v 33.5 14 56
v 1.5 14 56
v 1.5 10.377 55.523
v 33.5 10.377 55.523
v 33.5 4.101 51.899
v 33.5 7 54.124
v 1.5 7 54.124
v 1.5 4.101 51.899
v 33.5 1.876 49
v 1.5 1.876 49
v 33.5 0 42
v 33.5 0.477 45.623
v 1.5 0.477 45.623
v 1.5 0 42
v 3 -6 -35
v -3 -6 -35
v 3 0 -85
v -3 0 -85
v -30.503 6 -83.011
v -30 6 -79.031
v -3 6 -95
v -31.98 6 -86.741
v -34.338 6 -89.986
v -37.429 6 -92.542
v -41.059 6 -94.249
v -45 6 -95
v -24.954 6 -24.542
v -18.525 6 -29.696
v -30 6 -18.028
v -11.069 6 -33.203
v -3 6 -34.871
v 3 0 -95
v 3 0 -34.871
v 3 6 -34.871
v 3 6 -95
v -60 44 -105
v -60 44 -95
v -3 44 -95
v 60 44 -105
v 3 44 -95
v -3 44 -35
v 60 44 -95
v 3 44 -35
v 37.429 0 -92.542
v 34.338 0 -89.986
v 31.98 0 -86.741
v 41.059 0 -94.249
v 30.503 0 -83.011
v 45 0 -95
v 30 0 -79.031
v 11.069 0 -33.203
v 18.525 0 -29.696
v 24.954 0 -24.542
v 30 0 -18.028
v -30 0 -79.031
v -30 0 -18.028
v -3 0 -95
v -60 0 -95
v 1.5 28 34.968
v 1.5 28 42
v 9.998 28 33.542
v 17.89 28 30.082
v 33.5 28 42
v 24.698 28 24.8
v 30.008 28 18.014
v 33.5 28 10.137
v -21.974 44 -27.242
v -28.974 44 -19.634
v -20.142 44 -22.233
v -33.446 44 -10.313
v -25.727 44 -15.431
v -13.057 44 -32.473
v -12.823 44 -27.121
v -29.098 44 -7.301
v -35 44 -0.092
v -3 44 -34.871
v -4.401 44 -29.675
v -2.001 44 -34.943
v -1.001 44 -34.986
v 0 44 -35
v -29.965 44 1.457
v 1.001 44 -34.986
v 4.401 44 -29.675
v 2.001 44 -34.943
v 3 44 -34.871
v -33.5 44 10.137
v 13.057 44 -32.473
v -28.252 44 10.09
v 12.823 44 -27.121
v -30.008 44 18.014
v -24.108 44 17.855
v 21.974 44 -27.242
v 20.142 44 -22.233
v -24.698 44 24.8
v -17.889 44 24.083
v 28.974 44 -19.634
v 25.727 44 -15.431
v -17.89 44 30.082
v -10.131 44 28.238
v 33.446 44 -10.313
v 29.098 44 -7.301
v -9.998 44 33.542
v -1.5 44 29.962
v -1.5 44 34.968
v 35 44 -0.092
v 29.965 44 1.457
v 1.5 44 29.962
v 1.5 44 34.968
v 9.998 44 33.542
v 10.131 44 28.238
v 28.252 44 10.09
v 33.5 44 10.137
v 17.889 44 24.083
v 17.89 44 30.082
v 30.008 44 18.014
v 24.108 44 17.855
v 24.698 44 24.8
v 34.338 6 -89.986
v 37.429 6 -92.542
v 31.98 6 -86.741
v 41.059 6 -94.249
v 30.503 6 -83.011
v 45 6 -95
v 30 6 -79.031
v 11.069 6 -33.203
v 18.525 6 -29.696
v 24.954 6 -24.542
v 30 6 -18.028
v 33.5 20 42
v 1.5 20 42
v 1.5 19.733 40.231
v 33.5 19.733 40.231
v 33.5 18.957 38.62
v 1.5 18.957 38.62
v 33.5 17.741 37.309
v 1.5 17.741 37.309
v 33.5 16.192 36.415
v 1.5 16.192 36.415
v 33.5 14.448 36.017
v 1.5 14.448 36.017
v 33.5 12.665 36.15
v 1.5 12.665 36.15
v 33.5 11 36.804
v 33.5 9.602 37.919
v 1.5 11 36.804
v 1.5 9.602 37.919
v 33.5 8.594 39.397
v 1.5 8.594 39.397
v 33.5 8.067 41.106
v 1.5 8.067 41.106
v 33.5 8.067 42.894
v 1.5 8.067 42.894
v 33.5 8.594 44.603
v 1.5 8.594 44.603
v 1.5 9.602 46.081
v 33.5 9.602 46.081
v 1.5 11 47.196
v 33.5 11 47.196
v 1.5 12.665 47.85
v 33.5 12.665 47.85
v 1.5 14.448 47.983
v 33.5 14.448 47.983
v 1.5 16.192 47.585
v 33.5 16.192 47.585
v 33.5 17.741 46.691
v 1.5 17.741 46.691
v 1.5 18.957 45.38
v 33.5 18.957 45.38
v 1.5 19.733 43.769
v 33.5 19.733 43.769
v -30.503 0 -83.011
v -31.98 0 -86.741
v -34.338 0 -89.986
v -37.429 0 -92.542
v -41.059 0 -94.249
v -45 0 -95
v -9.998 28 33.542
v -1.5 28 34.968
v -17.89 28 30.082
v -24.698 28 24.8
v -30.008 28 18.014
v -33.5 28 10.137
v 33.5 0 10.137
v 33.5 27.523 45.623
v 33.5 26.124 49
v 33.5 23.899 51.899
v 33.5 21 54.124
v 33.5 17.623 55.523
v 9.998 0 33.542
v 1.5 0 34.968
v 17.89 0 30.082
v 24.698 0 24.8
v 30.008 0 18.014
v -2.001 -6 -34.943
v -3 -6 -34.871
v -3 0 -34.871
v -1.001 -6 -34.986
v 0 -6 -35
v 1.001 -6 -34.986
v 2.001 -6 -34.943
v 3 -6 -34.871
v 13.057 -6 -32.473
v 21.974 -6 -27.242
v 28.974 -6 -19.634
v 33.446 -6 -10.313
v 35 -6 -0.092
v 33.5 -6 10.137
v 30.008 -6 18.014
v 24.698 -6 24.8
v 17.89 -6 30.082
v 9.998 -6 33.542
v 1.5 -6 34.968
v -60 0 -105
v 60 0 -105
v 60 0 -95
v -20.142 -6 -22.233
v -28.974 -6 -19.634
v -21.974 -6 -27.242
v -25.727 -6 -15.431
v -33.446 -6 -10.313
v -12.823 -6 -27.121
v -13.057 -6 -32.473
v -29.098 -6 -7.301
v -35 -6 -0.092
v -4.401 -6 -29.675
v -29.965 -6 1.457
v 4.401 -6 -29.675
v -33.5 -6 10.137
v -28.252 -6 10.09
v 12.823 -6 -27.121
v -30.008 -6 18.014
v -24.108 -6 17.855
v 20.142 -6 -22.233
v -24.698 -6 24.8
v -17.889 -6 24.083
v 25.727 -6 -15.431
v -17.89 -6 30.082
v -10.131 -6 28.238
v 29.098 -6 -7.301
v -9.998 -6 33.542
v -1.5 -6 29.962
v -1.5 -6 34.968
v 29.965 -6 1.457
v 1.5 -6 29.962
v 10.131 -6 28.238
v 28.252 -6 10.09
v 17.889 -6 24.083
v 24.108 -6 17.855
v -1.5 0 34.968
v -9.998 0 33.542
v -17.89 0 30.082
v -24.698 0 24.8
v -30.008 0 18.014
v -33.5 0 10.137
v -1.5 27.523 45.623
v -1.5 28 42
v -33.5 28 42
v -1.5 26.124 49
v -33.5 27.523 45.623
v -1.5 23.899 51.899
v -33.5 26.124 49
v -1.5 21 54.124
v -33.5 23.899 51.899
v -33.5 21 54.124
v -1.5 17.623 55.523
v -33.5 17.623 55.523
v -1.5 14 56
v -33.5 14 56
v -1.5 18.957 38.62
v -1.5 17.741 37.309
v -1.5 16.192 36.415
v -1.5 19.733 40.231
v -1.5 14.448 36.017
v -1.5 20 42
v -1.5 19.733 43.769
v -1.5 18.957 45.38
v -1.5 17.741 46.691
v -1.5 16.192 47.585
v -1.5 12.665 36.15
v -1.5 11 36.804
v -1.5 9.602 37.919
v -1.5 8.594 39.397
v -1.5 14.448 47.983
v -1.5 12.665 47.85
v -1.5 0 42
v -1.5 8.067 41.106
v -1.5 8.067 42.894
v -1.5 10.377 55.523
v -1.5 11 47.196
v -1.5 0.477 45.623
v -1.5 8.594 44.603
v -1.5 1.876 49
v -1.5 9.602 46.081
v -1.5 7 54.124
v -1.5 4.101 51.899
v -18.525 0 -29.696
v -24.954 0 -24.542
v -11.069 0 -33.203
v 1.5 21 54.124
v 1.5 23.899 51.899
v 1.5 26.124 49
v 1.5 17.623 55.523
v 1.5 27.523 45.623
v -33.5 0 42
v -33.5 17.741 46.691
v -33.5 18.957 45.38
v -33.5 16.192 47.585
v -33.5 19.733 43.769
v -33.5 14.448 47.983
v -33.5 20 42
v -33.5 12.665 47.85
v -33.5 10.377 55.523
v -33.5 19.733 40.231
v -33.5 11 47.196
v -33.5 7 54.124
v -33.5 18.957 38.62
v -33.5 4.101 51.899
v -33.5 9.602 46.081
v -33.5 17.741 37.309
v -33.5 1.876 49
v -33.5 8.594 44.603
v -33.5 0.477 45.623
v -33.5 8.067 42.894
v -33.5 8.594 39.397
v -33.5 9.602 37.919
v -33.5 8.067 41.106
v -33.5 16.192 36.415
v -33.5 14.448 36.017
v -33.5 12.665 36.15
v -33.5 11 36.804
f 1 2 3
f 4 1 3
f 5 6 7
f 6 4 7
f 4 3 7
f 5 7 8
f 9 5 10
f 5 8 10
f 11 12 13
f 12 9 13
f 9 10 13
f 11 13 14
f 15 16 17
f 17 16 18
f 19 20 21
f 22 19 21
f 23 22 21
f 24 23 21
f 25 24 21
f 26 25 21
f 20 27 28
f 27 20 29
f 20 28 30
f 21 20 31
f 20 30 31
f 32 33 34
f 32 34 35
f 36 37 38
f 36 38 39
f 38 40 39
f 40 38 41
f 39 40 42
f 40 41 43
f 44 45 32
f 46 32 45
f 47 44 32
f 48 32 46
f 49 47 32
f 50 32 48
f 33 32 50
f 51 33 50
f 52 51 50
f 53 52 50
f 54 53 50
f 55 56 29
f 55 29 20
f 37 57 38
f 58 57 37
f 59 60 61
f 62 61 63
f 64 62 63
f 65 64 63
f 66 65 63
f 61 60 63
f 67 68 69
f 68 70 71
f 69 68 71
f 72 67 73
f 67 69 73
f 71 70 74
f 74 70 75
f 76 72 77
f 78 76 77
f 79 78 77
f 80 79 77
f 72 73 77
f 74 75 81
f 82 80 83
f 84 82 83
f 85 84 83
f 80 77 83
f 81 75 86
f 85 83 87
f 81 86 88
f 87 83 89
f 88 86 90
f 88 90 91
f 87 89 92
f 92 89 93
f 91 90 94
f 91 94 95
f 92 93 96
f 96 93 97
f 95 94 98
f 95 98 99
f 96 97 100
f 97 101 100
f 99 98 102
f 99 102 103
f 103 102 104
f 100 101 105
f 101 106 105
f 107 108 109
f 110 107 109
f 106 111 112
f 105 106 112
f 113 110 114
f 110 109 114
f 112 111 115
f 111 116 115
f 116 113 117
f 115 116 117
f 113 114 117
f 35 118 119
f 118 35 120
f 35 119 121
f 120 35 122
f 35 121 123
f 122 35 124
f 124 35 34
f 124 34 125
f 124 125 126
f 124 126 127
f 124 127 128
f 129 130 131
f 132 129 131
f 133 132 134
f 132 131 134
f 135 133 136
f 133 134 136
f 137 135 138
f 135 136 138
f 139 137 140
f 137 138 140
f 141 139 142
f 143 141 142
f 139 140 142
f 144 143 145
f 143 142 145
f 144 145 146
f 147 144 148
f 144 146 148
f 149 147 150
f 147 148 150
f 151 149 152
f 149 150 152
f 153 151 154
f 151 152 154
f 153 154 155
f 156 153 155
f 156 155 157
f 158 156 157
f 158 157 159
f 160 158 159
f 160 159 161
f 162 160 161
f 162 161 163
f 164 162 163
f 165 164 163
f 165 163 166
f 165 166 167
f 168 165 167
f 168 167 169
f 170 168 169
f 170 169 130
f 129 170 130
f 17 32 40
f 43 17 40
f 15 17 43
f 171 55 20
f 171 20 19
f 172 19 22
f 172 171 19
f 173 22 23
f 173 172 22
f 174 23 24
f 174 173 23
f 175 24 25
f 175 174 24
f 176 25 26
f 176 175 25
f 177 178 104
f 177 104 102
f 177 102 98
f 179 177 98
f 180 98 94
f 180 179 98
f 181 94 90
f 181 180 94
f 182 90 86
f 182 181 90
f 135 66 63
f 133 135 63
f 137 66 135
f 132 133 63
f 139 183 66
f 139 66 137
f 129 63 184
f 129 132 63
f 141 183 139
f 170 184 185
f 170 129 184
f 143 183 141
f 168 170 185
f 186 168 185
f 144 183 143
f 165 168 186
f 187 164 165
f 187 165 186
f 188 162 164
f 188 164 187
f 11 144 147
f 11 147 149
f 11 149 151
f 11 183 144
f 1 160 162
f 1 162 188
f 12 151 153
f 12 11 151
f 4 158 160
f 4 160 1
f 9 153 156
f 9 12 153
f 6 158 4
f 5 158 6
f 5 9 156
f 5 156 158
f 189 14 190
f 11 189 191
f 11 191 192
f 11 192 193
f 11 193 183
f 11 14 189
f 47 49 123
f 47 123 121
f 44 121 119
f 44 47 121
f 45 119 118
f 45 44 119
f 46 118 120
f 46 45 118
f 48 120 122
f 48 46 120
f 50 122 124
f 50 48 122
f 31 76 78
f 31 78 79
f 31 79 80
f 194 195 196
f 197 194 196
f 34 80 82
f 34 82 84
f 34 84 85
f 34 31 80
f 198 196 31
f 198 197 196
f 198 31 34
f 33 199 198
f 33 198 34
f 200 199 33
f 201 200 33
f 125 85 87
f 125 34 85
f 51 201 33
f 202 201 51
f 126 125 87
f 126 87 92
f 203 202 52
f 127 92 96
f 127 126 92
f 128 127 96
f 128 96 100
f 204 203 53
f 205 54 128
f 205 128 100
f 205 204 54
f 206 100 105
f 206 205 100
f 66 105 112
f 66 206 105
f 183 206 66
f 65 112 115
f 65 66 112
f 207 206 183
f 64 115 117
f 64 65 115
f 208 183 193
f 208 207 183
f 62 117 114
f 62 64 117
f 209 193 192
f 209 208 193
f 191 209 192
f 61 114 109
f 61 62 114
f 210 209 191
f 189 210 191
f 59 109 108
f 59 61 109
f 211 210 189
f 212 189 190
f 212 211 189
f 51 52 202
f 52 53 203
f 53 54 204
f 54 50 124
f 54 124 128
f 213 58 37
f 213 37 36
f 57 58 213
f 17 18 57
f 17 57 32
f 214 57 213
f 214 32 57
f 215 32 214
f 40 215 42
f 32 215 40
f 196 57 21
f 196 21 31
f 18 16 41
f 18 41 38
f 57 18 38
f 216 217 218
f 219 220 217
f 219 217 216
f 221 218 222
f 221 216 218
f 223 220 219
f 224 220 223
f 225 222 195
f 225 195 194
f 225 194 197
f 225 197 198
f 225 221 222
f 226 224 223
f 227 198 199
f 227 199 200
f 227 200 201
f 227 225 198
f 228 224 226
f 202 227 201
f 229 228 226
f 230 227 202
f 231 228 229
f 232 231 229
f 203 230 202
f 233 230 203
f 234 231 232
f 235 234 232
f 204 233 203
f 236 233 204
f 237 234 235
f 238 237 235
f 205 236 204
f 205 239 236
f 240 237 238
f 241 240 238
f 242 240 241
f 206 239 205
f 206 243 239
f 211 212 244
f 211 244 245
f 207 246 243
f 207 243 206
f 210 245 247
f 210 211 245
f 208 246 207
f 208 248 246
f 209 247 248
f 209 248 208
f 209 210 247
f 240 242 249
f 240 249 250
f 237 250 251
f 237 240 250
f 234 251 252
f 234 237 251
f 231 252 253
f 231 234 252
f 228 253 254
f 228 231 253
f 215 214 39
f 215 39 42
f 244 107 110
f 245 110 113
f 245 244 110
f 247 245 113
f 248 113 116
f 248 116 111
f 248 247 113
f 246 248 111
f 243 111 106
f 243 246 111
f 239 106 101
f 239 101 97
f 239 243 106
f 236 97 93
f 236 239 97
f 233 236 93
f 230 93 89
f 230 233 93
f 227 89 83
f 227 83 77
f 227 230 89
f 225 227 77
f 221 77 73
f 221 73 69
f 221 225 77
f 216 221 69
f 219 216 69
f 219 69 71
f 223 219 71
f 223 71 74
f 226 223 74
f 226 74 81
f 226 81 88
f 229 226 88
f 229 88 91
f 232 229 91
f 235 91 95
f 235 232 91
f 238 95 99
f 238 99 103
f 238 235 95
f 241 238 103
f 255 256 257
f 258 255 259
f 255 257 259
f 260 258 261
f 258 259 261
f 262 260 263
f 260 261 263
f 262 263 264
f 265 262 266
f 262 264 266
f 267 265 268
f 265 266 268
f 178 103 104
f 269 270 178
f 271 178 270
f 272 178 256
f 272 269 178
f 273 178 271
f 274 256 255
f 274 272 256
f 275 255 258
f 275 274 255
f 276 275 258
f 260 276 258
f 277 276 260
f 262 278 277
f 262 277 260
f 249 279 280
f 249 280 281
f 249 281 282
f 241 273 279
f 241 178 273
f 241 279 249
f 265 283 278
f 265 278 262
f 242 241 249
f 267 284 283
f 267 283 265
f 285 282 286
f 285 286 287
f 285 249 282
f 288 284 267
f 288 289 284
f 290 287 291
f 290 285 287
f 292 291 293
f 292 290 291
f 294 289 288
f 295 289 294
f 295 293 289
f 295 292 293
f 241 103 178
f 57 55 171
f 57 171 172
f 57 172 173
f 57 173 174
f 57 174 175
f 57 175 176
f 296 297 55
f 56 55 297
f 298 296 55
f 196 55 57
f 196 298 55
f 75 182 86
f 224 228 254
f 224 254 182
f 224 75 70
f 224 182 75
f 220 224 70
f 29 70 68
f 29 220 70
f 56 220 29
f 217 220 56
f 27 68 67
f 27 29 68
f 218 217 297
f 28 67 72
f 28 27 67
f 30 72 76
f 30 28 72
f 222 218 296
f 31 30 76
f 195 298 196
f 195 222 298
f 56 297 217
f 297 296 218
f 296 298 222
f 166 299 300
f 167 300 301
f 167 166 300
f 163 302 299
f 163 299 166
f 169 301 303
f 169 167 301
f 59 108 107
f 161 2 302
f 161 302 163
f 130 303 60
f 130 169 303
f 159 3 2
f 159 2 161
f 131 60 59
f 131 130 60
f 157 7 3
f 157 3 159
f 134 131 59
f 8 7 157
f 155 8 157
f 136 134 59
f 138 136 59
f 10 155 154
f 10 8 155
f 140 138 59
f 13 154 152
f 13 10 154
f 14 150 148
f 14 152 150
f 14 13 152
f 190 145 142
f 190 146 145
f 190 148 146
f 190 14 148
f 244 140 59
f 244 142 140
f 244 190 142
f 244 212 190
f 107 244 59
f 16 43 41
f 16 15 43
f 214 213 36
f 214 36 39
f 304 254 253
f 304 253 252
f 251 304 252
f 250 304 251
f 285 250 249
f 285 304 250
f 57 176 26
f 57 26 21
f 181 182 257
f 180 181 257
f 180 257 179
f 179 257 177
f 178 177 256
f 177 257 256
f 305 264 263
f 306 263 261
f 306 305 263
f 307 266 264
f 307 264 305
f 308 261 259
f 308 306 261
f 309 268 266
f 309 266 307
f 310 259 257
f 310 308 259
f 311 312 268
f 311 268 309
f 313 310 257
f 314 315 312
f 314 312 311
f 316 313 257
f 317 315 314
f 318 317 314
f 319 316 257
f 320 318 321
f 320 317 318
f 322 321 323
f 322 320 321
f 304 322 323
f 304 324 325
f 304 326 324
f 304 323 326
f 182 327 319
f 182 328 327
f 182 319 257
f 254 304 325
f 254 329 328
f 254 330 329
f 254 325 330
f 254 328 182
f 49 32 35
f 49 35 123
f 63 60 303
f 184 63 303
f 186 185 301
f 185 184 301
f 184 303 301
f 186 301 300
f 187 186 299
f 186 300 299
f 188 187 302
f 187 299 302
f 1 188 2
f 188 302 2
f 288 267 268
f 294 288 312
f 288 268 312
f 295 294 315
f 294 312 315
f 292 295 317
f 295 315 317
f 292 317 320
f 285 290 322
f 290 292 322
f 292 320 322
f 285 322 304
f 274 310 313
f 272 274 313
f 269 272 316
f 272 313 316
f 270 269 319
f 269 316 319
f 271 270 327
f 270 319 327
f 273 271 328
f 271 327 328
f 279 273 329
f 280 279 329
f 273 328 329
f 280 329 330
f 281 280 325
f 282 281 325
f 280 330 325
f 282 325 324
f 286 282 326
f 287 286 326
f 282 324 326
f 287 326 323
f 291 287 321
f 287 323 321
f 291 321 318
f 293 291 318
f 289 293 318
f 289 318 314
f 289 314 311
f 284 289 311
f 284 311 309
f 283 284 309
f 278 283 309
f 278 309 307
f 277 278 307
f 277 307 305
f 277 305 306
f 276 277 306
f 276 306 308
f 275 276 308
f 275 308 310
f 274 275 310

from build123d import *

# Parameters (mm, degrees)
F1_DEPTH = 6
F2_DEPTH = 44
F0_W     = 6
F0_H     = 10
F3_DEPTH = 6
F4_DEPTH = 28
F6_DEPTH = 93.501
F7_DEPTH = 93.501


with BuildPart() as f1:
    # F0 (on Front) → F1 (new body)
    with BuildSketch(Plane.XZ):
        with BuildLine():
            ThreePointArc((-33.5, 10.1365674664), (-34.7328343847, -4.3162733471), (-30, -18.0277563773))
            ThreePointArc((-30, -18.0277563773), (-18.5249919592, -29.695532878), (-3, -34.8711915483))
            ThreePointArc((-3, -34.8711915483), (-1.5013819904, -34.9677830598), (1.54e-08, -35))
            ThreePointArc((1.54e-08, -35), (1.5013820058, -34.9677830592), (3, -34.8711915483))
            ThreePointArc((3, -34.8711915483), (18.5249919592, -29.695532878), (30, -18.0277563773))
            ThreePointArc((30, -18.0277563773), (34.7328343847, -4.3162733471), (33.5, 10.1365674664))
            ThreePointArc((33.5, 10.1365674664), (21.4568882491, 27.6514366113), (1.5, 34.9678423698))
            Line((1.5, 34.9678423698), (1.5, 29.9624765332))
            ThreePointArc((1.5, 29.9624765332), (0, -30), (-1.5, 29.9624765332))
            Line((-1.5, 29.9624765332), (-1.5, 34.9678423698))
            ThreePointArc((-1.5, 34.9678423698), (-21.4568882491, 27.6514366113), (-33.5, 10.1365674664))
        make_face()
    extrude(amount=F1_DEPTH)

    # F0 (on Front) → F2 (join)
    with BuildSketch(Plane.XZ):
        with BuildLine():
            ThreePointArc((-33.5, 10.1365674664), (-34.7328343847, -4.3162733471), (-30, -18.0277563773))
            ThreePointArc((-30, -18.0277563773), (-18.5249919592, -29.695532878), (-3, -34.8711915483))
            ThreePointArc((-3, -34.8711915483), (-1.5013819904, -34.9677830598), (1.54e-08, -35))
            ThreePointArc((1.54e-08, -35), (1.5013820058, -34.9677830592), (3, -34.8711915483))
            ThreePointArc((3, -34.8711915483), (18.5249919592, -29.695532878), (30, -18.0277563773))
            ThreePointArc((30, -18.0277563773), (34.7328343847, -4.3162733471), (33.5, 10.1365674664))
            ThreePointArc((33.5, 10.1365674664), (21.4568882491, 27.6514366113), (1.5, 34.9678423698))
            Line((1.5, 34.9678423698), (1.5, 29.9624765332))
            ThreePointArc((1.5, 29.9624765332), (0, -30), (-1.5, 29.9624765332))
            Line((-1.5, 29.9624765332), (-1.5, 34.9678423698))
            ThreePointArc((-1.5, 34.9678423698), (-21.4568882491, 27.6514366113), (-33.5, 10.1365674664))
        make_face()
    extrude(amount=-F2_DEPTH)

    # F0 (on Front) → F3 (join)
    with BuildSketch(Plane.XZ):
        with BuildLine():
            Line((-30, -18.0277563773), (-30, -35))
            Line((-30, -35), (-3, -35))
            Line((-3, -35), (-3, -34.8711915483))
            ThreePointArc((-3, -34.8711915483), (-18.5249919592, -29.695532878), (-30, -18.0277563773))
        make_face()
        with BuildLine():
            Line((3, -34.8711915483), (3, -35))
            Line((3, -35), (30, -35))
            Line((30, -35), (30, -18.0277563773))
            ThreePointArc((30, -18.0277563773), (18.5249919592, -29.695532878), (3, -34.8711915483))
        make_face()
        with BuildLine():
            Line((-30, -95), (-30, -79.0312805773))
            ThreePointArc((-30, -79.0312805773), (-34.3380962103, -89.9857317274), (-45, -95))
            Line((-45, -95), (-30, -95))
        make_face()
        with BuildLine():
            ThreePointArc((45, -95), (34.3380962103, -89.9857317274), (30, -79.0312805773))
            Line((30, -79.0312805773), (30, -95))
            Line((30, -95), (45, -95))
        make_face()
        Polygon((-3, -35), (-30, -35), (-30, -79.0312805773), (-30, -95), (-3, -95), (-3, -85), align=None)
        Polygon((30, -35), (3, -35), (3, -85), (3, -95), (30, -95), (30, -79.0312805773), align=None)
    extrude(amount=-F3_DEPTH)

    # F0 (on Front) → F4 (join)
    with BuildSketch(Plane.XZ):
        with BuildLine():
            Line((-33.5, 56), (-33.5, 10.1365674664))
            ThreePointArc((-33.5, 10.1365674664), (-21.4568882491, 27.6514366113), (-1.5, 34.9678423698))
            Line((-1.5, 34.9678423698), (-1.5, 56))
            Line((-1.5, 56), (-33.5, 56))
        make_face()
        with BuildLine():
            ThreePointArc((1.5, 34.9678423698), (21.4568882491, 27.6514366113), (33.5, 10.1365674664))
            Line((33.5, 10.1365674664), (33.5, 56))
            Line((33.5, 56), (1.5, 56))
            Line((1.5, 56), (1.5, 34.9678423698))
        make_face()
    extrude(amount=-F4_DEPTH)


with BuildPart() as f1b:
    # F0 (on Front) → F1, piece 2 (new body)
    with BuildSketch(Plane.XZ):
        Polygon((1.54e-08, -35), (-3, -35), (-3, -85), (3, -85), (3, -35), align=None)
    extrude(amount=F1_DEPTH)

    # F0 (on Front) → F2, piece 2 (join)
    with BuildSketch(Plane.XZ):
        Polygon((1.54e-08, -35), (-3, -35), (-3, -85), (3, -85), (3, -35), align=None)
        Polygon((-3, -95), (-30, -95), (-45, -95), (-60, -95), (-60, -105), (60, -105), (60, -95), (45, -95), (30, -95), (3, -95), align=None)
        with Locations((0, -90)):
            Rectangle(F0_W, F0_H)
    extrude(amount=-F2_DEPTH)


with BuildPart() as f6_tool:
    # F5 (on face) → F6 (new body, through all)
    with BuildSketch(Plane(origin=(-33.5, 0, 0), x_dir=(0, -1, 0), z_dir=(-1, 0, 0))):
        with BuildLine():
            ThreePointArc((-28, 42), (-23.8994949366, 51.8994949366), (-14, 56))
            Line((-14, 56), (-28, 56))
            Line((-28, 56), (-28, 42))
        make_face()
        with BuildLine():
            ThreePointArc((-14, 56), (-4.1005050634, 51.8994949366), (0, 42))
            Line((0, 42), (0, 56))
            Line((0, 56), (-14, 56))
        make_face()
        with BuildLine():
            Line((-20, 42), (-8, 42))
            ThreePointArc((-8, 42), (-14, 48), (-20, 42))
        make_face()
        with BuildLine():
            ThreePointArc((-20, 42), (-14, 36), (-8, 42))
            Line((-8, 42), (-20, 42))
        make_face()
        Polygon((0, -85), (6, -85), (6, -35), align=None)
    extrude(amount=-F6_DEPTH)


with BuildPart() as f1_1:
    add(f1.part)

    # F6: cut by f6_tool
    add(f6_tool.part, mode=Mode.SUBTRACT)

    # F5 (on face) → F7 (cut, through all)
    with BuildSketch(Plane(origin=(-33.5, 0, 0), x_dir=(0, -1, 0), z_dir=(-1, 0, 0))):
        Polygon((0, -85), (6, -85), (6, -35), align=None)
    extrude(amount=-F7_DEPTH, mode=Mode.SUBTRACT)


with BuildPart() as f1b_1:
    add(f1b.part)

    # F6: cut by f6_tool
    add(f6_tool.part, mode=Mode.SUBTRACT)


solid = Compound([f1_1.part, f1b_1.part])
